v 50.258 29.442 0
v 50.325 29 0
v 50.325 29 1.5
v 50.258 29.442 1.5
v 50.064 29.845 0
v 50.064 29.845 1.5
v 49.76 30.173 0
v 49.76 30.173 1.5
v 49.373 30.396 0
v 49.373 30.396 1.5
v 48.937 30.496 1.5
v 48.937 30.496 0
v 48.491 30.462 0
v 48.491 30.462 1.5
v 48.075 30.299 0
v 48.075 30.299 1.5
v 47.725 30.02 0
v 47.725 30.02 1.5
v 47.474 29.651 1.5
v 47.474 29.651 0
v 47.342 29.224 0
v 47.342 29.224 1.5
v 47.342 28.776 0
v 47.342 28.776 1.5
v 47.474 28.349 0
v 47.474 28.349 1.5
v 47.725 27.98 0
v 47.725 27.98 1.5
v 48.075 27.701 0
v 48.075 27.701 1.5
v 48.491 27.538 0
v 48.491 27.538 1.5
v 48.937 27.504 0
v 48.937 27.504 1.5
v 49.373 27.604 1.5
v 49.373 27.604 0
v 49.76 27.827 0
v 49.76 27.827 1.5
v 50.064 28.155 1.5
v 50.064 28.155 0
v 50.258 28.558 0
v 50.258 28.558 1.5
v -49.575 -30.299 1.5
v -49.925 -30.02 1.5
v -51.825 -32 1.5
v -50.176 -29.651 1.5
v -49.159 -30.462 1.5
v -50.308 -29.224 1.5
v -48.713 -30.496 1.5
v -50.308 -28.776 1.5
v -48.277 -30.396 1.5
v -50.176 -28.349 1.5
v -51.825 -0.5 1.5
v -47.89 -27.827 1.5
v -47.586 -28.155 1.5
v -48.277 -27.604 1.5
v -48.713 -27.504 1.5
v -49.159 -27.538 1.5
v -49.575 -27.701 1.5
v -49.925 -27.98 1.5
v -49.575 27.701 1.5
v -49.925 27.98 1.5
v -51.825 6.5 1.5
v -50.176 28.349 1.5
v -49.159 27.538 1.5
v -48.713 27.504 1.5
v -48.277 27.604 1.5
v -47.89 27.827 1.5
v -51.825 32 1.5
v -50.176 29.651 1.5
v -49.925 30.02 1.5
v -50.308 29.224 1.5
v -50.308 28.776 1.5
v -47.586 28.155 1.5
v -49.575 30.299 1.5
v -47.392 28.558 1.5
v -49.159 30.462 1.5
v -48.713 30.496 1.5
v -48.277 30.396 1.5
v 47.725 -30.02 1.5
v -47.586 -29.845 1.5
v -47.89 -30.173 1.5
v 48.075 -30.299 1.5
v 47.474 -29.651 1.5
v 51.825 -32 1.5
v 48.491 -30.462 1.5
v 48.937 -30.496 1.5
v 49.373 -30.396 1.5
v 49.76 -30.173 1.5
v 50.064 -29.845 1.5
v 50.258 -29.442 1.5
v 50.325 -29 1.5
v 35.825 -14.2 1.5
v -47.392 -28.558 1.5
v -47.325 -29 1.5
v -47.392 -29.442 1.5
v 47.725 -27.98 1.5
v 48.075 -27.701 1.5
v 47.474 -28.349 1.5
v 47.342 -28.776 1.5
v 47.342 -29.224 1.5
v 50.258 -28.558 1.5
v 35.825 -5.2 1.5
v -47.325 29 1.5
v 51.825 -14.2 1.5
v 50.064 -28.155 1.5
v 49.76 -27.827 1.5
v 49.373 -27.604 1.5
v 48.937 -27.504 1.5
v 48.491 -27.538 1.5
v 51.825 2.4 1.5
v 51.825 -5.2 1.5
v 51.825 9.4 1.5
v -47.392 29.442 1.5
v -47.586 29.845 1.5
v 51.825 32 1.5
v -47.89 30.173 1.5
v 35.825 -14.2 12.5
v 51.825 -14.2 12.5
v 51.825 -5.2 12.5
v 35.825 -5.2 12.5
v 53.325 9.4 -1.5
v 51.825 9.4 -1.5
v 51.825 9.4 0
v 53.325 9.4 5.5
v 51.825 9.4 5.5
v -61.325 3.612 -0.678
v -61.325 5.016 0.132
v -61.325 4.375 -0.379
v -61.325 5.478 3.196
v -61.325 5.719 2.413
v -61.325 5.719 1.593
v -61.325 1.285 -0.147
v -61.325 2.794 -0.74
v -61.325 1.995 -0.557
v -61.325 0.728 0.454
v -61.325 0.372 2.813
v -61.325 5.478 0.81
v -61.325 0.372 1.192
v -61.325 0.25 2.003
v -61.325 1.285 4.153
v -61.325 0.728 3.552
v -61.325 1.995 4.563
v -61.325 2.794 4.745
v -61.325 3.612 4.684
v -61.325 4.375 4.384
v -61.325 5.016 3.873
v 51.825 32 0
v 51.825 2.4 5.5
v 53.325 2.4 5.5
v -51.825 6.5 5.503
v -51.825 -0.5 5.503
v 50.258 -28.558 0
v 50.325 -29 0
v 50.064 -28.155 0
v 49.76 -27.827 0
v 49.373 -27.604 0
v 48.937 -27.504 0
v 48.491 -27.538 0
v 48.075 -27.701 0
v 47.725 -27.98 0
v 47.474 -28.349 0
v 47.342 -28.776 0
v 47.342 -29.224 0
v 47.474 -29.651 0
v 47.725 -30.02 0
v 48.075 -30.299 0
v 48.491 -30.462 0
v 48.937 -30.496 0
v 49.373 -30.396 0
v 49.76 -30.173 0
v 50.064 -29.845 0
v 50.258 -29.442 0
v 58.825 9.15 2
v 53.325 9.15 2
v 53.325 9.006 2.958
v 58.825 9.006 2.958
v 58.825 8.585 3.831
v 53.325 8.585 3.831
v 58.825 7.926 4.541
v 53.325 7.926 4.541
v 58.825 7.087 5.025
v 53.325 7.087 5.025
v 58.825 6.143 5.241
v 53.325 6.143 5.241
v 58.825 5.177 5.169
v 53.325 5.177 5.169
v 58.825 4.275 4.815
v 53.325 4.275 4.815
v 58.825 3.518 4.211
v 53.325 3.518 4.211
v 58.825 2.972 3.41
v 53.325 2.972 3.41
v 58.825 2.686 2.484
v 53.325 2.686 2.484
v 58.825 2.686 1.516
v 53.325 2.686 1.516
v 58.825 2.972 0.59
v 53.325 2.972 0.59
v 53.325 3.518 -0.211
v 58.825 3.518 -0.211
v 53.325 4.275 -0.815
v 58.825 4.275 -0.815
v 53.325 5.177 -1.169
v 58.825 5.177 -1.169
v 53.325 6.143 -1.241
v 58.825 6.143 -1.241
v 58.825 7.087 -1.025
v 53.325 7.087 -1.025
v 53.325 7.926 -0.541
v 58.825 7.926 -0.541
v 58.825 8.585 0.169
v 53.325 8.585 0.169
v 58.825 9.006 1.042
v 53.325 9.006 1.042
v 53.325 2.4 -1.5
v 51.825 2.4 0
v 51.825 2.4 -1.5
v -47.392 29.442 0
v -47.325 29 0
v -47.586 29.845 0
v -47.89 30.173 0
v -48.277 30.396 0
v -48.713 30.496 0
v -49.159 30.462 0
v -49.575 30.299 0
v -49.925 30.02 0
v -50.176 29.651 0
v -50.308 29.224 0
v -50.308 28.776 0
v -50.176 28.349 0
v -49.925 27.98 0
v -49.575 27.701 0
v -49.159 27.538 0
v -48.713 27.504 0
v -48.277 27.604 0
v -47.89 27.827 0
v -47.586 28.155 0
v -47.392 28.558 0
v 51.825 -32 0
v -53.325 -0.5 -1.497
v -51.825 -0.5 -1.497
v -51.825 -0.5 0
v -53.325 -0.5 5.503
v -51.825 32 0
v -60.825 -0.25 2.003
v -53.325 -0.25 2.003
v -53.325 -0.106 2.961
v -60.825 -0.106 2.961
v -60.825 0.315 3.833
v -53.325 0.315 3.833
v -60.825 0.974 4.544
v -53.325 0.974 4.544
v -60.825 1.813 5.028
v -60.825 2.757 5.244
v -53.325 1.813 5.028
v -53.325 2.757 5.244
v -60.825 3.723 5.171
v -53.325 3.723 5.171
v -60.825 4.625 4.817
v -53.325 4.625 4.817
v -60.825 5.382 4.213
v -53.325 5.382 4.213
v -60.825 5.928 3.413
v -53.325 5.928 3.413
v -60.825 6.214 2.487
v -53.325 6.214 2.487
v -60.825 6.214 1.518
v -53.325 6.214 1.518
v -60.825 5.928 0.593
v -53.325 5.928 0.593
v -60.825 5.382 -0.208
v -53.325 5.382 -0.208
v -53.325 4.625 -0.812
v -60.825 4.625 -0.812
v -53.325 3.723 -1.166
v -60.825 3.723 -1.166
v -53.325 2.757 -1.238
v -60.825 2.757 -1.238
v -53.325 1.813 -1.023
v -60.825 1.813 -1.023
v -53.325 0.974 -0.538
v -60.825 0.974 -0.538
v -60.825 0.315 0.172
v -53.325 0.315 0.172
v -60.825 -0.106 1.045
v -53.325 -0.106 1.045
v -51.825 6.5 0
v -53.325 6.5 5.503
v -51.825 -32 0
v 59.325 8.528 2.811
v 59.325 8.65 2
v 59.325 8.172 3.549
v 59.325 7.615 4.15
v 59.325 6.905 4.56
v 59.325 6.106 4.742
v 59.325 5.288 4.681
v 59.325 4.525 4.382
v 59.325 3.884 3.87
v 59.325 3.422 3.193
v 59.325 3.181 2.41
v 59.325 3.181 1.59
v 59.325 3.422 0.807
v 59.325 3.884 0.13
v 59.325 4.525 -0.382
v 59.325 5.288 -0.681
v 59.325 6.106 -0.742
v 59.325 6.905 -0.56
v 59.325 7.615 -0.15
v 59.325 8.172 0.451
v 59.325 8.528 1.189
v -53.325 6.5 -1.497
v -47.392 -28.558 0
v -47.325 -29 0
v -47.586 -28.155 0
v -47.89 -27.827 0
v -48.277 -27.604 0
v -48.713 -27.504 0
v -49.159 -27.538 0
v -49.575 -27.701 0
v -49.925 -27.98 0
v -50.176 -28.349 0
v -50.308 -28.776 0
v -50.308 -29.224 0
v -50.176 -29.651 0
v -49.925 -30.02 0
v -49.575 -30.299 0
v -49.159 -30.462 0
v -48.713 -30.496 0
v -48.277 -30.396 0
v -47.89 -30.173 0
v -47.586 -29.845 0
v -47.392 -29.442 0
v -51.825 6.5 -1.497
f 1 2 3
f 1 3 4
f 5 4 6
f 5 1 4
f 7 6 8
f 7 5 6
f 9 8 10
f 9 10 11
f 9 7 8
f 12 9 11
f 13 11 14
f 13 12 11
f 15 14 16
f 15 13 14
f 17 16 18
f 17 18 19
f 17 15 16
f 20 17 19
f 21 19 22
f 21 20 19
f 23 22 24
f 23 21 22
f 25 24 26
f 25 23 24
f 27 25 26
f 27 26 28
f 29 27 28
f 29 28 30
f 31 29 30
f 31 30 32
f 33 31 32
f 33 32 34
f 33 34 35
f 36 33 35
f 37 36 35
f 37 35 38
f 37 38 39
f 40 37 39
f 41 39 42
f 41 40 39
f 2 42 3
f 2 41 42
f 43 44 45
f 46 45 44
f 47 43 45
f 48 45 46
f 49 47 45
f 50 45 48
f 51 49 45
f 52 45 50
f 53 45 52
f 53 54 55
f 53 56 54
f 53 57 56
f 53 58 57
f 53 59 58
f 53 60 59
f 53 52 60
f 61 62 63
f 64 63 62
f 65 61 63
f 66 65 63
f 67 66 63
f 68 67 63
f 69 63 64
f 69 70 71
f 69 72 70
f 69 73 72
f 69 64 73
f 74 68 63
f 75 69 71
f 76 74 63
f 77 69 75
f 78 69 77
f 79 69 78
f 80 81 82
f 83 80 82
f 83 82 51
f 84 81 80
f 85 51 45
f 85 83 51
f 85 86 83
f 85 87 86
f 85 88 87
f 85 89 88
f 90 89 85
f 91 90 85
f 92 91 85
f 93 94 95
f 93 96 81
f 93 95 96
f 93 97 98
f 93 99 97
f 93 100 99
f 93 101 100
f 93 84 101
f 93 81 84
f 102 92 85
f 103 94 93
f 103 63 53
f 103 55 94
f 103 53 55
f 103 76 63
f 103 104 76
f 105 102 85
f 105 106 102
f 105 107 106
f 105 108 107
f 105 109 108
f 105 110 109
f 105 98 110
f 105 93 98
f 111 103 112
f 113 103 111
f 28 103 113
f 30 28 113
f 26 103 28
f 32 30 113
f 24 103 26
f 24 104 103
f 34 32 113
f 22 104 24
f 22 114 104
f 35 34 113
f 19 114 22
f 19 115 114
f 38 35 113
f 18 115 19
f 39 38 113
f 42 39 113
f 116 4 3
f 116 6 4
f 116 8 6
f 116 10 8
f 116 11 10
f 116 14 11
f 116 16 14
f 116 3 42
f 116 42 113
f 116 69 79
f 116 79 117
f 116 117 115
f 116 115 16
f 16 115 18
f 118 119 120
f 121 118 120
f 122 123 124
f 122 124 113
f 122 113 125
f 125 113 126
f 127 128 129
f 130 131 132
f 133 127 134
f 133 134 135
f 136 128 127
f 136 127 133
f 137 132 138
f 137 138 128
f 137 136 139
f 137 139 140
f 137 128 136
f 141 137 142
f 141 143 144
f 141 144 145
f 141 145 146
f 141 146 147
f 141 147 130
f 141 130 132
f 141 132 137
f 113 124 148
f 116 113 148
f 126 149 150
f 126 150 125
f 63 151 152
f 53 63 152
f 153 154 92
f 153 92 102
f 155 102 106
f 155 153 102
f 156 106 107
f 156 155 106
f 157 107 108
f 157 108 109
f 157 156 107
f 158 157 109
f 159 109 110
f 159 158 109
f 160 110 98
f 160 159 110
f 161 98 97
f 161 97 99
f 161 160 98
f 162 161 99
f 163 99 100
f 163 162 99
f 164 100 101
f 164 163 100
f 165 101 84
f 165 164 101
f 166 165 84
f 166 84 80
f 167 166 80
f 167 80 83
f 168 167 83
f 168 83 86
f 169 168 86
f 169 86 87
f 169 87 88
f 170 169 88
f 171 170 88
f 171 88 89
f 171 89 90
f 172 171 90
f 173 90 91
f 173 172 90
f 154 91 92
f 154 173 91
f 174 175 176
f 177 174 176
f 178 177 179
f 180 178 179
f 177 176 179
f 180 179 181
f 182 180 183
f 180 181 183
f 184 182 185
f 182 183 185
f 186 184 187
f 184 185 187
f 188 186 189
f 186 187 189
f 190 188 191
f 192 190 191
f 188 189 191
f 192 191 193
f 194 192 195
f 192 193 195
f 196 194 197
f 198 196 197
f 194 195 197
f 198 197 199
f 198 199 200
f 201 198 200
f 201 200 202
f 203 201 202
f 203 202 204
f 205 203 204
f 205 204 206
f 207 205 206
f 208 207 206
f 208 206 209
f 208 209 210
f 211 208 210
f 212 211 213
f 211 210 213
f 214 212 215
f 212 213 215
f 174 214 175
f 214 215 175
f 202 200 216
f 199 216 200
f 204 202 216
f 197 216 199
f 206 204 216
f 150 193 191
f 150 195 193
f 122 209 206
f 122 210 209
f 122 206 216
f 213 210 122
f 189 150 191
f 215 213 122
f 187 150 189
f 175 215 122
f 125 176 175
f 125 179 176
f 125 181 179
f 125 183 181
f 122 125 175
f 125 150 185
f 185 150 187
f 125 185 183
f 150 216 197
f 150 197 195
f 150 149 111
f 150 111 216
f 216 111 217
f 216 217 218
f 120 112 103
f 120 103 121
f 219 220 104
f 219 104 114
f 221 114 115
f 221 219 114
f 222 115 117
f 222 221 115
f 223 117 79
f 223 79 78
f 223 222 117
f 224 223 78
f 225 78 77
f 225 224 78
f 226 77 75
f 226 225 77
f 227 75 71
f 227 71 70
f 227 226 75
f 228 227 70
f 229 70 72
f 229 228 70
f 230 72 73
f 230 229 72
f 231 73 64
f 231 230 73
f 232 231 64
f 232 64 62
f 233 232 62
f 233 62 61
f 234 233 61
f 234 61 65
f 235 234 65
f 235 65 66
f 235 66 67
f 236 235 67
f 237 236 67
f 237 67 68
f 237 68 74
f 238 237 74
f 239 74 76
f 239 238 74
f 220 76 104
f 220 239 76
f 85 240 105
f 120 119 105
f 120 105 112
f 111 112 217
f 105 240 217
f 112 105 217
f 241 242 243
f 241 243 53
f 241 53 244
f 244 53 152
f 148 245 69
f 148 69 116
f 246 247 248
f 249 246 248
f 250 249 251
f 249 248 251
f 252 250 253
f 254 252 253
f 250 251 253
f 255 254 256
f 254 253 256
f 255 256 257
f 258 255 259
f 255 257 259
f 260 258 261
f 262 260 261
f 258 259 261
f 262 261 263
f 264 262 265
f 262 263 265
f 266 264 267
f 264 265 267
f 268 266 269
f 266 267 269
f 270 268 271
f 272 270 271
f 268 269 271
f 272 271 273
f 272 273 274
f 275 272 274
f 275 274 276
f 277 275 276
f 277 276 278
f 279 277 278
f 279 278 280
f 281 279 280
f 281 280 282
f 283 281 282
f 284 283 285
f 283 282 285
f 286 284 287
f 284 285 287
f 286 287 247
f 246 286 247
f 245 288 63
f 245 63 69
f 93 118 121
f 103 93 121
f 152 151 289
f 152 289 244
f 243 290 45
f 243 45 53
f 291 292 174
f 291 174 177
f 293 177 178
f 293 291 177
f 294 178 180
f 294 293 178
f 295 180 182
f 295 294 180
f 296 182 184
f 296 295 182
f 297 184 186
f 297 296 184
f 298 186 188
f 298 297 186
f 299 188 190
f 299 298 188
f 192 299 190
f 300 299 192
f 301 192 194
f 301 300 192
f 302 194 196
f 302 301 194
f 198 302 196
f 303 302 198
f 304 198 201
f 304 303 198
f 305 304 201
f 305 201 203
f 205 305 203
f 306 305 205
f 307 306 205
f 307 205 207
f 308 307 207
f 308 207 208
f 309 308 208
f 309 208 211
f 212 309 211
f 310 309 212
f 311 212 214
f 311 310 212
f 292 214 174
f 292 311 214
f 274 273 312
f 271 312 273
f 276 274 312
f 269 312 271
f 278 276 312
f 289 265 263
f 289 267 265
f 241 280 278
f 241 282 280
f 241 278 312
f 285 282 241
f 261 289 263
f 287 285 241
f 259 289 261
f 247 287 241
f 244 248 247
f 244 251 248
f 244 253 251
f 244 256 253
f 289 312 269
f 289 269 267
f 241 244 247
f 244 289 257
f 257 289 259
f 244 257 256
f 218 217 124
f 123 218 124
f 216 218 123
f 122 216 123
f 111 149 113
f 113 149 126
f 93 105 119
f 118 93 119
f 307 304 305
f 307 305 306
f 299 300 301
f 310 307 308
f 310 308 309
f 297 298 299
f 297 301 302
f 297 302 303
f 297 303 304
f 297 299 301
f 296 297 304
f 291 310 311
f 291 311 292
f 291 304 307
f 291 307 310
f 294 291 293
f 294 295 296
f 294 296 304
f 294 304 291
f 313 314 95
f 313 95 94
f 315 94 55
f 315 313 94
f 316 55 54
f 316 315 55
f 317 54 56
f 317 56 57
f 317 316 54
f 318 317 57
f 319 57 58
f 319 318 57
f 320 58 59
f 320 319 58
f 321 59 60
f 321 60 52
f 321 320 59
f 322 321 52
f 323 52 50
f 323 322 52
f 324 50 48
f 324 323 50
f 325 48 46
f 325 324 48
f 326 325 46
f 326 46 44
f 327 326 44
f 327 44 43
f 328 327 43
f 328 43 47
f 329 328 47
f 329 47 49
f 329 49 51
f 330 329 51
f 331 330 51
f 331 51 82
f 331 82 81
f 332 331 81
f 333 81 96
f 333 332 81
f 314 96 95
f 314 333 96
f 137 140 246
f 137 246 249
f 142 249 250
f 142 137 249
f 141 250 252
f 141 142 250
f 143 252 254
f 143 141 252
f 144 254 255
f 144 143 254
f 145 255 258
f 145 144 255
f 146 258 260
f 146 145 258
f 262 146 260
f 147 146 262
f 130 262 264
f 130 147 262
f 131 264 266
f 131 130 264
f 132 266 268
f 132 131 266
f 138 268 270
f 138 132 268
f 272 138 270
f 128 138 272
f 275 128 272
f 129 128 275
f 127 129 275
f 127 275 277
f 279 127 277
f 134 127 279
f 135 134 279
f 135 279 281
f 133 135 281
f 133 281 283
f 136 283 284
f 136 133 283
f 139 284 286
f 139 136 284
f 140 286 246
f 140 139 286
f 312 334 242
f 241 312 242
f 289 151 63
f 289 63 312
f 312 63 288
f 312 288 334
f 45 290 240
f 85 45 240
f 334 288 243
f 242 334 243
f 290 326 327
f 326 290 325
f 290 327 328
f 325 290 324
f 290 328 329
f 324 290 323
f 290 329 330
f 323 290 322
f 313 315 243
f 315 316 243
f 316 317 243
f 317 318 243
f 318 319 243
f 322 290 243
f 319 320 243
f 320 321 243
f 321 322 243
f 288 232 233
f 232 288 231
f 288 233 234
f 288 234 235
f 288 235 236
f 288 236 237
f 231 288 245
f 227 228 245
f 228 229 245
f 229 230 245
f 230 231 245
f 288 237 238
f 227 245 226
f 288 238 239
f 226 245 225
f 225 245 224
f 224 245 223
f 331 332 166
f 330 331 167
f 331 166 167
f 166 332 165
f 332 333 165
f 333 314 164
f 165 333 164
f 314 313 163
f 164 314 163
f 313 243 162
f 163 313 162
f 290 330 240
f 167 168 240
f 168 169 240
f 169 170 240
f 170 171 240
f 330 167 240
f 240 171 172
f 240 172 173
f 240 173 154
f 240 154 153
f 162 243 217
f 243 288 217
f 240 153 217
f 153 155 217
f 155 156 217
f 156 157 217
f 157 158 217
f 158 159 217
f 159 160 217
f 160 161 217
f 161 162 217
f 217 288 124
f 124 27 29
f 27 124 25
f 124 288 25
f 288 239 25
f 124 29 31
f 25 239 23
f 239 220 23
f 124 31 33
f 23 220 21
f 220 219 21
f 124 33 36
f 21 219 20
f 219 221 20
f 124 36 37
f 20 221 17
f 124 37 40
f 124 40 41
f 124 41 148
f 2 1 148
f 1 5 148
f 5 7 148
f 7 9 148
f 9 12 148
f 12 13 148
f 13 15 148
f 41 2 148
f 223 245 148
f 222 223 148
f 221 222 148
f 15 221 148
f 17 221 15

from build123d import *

# Parameters (mm, degrees)
F0_W      = 103.65
F0_H      = 64
F0_R      = 1.5
F1_DEPTH  = 1.5
F2_W      = 9
F2_H      = 11
F3_DEPTH  = 16
F4_W      = 7
F4_H      = 7
F4_H_2    = 4
F5_DEPTH  = 1.5
F6_R      = 3.25
F7_DEPTH  = 6
F8_W      = 7
F8_H      = 4.0027049468
F8_H_2    = 1.5
F8_H_3    = 1.4972950532
F9_DEPTH  = 1.5
F10_R     = 3.25
F11_DEPTH = 8
F12_SIZE  = 0.5
F13_SIZE  = 0.5


with BuildPart() as f1:
    # F0 (on Top) → F1 (new body)
    with BuildSketch(Plane.XY):
        Rectangle(F0_W, F0_H)
        with Locations((-48.825, -29)):
            Circle(F0_R, mode=Mode.SUBTRACT)
        with Locations((48.825, -29)):
            Circle(F0_R, mode=Mode.SUBTRACT)
        with Locations((-48.825, 29)):
            Circle(F0_R, mode=Mode.SUBTRACT)
        with Locations((48.825, 29)):
            Circle(F0_R, mode=Mode.SUBTRACT)
    extrude(amount=F1_DEPTH)

    # F2 (on face) → F3 (join)
    with BuildSketch(Plane.YZ.offset(51.825)):
        with Locations((-9.7, 7)):
            Rectangle(F2_W, F2_H)
    extrude(amount=-F3_DEPTH)

    # F4 (on face) → F5 (join)
    with BuildSketch(Plane.YZ.offset(51.825)):
        with Locations((5.9, 2)):
            Rectangle(F4_W, F4_H)
        with Locations((5.9, 3.5)):
            Rectangle(F4_W, F4_H_2)
    extrude(amount=F5_DEPTH)

    # F6 (on face) → F7 (join)
    with BuildSketch(Plane.YZ.offset(53.325)):
        with Locations((5.9, 2)):
            Circle(F6_R)
    extrude(amount=F7_DEPTH)

    # F8 (on face) → F9 (join)
    with BuildSketch(Plane(origin=(-51.825, 0, 0), x_dir=(0, -1, 0), z_dir=(-1, 0, 0))):
        with Locations((-3, 3.5013524734)):
            Rectangle(F8_W, F8_H)
        with Locations((-3, 0.75)):
            Rectangle(F8_W, F8_H_2)
        with Locations((-3, -0.7486475266)):
            Rectangle(F8_W, F8_H_3)
    extrude(amount=F9_DEPTH)

    # F10 (on face) → F11 (join)
    with BuildSketch(Plane(origin=(-53.325, 0, 0), x_dir=(0, -1, 0), z_dir=(-1, 0, 0))):
        with Locations((-3, 2.0027049468)):
            Circle(F10_R)
    extrude(amount=F11_DEPTH)

    # F12
    f12_edges = [f1.edges().sort_by_distance(p)[0] for p in [
        (-61.325, 6.25, 2.002705),
    ]]
    chamfer(f12_edges, length=F12_SIZE)

    # F13
    f13_edges = [f1.edges().sort_by_distance(p)[0] for p in [
        (59.325, 2.65, 2),
    ]]
    chamfer(f13_edges, length=F13_SIZE)


solid = f1.part
